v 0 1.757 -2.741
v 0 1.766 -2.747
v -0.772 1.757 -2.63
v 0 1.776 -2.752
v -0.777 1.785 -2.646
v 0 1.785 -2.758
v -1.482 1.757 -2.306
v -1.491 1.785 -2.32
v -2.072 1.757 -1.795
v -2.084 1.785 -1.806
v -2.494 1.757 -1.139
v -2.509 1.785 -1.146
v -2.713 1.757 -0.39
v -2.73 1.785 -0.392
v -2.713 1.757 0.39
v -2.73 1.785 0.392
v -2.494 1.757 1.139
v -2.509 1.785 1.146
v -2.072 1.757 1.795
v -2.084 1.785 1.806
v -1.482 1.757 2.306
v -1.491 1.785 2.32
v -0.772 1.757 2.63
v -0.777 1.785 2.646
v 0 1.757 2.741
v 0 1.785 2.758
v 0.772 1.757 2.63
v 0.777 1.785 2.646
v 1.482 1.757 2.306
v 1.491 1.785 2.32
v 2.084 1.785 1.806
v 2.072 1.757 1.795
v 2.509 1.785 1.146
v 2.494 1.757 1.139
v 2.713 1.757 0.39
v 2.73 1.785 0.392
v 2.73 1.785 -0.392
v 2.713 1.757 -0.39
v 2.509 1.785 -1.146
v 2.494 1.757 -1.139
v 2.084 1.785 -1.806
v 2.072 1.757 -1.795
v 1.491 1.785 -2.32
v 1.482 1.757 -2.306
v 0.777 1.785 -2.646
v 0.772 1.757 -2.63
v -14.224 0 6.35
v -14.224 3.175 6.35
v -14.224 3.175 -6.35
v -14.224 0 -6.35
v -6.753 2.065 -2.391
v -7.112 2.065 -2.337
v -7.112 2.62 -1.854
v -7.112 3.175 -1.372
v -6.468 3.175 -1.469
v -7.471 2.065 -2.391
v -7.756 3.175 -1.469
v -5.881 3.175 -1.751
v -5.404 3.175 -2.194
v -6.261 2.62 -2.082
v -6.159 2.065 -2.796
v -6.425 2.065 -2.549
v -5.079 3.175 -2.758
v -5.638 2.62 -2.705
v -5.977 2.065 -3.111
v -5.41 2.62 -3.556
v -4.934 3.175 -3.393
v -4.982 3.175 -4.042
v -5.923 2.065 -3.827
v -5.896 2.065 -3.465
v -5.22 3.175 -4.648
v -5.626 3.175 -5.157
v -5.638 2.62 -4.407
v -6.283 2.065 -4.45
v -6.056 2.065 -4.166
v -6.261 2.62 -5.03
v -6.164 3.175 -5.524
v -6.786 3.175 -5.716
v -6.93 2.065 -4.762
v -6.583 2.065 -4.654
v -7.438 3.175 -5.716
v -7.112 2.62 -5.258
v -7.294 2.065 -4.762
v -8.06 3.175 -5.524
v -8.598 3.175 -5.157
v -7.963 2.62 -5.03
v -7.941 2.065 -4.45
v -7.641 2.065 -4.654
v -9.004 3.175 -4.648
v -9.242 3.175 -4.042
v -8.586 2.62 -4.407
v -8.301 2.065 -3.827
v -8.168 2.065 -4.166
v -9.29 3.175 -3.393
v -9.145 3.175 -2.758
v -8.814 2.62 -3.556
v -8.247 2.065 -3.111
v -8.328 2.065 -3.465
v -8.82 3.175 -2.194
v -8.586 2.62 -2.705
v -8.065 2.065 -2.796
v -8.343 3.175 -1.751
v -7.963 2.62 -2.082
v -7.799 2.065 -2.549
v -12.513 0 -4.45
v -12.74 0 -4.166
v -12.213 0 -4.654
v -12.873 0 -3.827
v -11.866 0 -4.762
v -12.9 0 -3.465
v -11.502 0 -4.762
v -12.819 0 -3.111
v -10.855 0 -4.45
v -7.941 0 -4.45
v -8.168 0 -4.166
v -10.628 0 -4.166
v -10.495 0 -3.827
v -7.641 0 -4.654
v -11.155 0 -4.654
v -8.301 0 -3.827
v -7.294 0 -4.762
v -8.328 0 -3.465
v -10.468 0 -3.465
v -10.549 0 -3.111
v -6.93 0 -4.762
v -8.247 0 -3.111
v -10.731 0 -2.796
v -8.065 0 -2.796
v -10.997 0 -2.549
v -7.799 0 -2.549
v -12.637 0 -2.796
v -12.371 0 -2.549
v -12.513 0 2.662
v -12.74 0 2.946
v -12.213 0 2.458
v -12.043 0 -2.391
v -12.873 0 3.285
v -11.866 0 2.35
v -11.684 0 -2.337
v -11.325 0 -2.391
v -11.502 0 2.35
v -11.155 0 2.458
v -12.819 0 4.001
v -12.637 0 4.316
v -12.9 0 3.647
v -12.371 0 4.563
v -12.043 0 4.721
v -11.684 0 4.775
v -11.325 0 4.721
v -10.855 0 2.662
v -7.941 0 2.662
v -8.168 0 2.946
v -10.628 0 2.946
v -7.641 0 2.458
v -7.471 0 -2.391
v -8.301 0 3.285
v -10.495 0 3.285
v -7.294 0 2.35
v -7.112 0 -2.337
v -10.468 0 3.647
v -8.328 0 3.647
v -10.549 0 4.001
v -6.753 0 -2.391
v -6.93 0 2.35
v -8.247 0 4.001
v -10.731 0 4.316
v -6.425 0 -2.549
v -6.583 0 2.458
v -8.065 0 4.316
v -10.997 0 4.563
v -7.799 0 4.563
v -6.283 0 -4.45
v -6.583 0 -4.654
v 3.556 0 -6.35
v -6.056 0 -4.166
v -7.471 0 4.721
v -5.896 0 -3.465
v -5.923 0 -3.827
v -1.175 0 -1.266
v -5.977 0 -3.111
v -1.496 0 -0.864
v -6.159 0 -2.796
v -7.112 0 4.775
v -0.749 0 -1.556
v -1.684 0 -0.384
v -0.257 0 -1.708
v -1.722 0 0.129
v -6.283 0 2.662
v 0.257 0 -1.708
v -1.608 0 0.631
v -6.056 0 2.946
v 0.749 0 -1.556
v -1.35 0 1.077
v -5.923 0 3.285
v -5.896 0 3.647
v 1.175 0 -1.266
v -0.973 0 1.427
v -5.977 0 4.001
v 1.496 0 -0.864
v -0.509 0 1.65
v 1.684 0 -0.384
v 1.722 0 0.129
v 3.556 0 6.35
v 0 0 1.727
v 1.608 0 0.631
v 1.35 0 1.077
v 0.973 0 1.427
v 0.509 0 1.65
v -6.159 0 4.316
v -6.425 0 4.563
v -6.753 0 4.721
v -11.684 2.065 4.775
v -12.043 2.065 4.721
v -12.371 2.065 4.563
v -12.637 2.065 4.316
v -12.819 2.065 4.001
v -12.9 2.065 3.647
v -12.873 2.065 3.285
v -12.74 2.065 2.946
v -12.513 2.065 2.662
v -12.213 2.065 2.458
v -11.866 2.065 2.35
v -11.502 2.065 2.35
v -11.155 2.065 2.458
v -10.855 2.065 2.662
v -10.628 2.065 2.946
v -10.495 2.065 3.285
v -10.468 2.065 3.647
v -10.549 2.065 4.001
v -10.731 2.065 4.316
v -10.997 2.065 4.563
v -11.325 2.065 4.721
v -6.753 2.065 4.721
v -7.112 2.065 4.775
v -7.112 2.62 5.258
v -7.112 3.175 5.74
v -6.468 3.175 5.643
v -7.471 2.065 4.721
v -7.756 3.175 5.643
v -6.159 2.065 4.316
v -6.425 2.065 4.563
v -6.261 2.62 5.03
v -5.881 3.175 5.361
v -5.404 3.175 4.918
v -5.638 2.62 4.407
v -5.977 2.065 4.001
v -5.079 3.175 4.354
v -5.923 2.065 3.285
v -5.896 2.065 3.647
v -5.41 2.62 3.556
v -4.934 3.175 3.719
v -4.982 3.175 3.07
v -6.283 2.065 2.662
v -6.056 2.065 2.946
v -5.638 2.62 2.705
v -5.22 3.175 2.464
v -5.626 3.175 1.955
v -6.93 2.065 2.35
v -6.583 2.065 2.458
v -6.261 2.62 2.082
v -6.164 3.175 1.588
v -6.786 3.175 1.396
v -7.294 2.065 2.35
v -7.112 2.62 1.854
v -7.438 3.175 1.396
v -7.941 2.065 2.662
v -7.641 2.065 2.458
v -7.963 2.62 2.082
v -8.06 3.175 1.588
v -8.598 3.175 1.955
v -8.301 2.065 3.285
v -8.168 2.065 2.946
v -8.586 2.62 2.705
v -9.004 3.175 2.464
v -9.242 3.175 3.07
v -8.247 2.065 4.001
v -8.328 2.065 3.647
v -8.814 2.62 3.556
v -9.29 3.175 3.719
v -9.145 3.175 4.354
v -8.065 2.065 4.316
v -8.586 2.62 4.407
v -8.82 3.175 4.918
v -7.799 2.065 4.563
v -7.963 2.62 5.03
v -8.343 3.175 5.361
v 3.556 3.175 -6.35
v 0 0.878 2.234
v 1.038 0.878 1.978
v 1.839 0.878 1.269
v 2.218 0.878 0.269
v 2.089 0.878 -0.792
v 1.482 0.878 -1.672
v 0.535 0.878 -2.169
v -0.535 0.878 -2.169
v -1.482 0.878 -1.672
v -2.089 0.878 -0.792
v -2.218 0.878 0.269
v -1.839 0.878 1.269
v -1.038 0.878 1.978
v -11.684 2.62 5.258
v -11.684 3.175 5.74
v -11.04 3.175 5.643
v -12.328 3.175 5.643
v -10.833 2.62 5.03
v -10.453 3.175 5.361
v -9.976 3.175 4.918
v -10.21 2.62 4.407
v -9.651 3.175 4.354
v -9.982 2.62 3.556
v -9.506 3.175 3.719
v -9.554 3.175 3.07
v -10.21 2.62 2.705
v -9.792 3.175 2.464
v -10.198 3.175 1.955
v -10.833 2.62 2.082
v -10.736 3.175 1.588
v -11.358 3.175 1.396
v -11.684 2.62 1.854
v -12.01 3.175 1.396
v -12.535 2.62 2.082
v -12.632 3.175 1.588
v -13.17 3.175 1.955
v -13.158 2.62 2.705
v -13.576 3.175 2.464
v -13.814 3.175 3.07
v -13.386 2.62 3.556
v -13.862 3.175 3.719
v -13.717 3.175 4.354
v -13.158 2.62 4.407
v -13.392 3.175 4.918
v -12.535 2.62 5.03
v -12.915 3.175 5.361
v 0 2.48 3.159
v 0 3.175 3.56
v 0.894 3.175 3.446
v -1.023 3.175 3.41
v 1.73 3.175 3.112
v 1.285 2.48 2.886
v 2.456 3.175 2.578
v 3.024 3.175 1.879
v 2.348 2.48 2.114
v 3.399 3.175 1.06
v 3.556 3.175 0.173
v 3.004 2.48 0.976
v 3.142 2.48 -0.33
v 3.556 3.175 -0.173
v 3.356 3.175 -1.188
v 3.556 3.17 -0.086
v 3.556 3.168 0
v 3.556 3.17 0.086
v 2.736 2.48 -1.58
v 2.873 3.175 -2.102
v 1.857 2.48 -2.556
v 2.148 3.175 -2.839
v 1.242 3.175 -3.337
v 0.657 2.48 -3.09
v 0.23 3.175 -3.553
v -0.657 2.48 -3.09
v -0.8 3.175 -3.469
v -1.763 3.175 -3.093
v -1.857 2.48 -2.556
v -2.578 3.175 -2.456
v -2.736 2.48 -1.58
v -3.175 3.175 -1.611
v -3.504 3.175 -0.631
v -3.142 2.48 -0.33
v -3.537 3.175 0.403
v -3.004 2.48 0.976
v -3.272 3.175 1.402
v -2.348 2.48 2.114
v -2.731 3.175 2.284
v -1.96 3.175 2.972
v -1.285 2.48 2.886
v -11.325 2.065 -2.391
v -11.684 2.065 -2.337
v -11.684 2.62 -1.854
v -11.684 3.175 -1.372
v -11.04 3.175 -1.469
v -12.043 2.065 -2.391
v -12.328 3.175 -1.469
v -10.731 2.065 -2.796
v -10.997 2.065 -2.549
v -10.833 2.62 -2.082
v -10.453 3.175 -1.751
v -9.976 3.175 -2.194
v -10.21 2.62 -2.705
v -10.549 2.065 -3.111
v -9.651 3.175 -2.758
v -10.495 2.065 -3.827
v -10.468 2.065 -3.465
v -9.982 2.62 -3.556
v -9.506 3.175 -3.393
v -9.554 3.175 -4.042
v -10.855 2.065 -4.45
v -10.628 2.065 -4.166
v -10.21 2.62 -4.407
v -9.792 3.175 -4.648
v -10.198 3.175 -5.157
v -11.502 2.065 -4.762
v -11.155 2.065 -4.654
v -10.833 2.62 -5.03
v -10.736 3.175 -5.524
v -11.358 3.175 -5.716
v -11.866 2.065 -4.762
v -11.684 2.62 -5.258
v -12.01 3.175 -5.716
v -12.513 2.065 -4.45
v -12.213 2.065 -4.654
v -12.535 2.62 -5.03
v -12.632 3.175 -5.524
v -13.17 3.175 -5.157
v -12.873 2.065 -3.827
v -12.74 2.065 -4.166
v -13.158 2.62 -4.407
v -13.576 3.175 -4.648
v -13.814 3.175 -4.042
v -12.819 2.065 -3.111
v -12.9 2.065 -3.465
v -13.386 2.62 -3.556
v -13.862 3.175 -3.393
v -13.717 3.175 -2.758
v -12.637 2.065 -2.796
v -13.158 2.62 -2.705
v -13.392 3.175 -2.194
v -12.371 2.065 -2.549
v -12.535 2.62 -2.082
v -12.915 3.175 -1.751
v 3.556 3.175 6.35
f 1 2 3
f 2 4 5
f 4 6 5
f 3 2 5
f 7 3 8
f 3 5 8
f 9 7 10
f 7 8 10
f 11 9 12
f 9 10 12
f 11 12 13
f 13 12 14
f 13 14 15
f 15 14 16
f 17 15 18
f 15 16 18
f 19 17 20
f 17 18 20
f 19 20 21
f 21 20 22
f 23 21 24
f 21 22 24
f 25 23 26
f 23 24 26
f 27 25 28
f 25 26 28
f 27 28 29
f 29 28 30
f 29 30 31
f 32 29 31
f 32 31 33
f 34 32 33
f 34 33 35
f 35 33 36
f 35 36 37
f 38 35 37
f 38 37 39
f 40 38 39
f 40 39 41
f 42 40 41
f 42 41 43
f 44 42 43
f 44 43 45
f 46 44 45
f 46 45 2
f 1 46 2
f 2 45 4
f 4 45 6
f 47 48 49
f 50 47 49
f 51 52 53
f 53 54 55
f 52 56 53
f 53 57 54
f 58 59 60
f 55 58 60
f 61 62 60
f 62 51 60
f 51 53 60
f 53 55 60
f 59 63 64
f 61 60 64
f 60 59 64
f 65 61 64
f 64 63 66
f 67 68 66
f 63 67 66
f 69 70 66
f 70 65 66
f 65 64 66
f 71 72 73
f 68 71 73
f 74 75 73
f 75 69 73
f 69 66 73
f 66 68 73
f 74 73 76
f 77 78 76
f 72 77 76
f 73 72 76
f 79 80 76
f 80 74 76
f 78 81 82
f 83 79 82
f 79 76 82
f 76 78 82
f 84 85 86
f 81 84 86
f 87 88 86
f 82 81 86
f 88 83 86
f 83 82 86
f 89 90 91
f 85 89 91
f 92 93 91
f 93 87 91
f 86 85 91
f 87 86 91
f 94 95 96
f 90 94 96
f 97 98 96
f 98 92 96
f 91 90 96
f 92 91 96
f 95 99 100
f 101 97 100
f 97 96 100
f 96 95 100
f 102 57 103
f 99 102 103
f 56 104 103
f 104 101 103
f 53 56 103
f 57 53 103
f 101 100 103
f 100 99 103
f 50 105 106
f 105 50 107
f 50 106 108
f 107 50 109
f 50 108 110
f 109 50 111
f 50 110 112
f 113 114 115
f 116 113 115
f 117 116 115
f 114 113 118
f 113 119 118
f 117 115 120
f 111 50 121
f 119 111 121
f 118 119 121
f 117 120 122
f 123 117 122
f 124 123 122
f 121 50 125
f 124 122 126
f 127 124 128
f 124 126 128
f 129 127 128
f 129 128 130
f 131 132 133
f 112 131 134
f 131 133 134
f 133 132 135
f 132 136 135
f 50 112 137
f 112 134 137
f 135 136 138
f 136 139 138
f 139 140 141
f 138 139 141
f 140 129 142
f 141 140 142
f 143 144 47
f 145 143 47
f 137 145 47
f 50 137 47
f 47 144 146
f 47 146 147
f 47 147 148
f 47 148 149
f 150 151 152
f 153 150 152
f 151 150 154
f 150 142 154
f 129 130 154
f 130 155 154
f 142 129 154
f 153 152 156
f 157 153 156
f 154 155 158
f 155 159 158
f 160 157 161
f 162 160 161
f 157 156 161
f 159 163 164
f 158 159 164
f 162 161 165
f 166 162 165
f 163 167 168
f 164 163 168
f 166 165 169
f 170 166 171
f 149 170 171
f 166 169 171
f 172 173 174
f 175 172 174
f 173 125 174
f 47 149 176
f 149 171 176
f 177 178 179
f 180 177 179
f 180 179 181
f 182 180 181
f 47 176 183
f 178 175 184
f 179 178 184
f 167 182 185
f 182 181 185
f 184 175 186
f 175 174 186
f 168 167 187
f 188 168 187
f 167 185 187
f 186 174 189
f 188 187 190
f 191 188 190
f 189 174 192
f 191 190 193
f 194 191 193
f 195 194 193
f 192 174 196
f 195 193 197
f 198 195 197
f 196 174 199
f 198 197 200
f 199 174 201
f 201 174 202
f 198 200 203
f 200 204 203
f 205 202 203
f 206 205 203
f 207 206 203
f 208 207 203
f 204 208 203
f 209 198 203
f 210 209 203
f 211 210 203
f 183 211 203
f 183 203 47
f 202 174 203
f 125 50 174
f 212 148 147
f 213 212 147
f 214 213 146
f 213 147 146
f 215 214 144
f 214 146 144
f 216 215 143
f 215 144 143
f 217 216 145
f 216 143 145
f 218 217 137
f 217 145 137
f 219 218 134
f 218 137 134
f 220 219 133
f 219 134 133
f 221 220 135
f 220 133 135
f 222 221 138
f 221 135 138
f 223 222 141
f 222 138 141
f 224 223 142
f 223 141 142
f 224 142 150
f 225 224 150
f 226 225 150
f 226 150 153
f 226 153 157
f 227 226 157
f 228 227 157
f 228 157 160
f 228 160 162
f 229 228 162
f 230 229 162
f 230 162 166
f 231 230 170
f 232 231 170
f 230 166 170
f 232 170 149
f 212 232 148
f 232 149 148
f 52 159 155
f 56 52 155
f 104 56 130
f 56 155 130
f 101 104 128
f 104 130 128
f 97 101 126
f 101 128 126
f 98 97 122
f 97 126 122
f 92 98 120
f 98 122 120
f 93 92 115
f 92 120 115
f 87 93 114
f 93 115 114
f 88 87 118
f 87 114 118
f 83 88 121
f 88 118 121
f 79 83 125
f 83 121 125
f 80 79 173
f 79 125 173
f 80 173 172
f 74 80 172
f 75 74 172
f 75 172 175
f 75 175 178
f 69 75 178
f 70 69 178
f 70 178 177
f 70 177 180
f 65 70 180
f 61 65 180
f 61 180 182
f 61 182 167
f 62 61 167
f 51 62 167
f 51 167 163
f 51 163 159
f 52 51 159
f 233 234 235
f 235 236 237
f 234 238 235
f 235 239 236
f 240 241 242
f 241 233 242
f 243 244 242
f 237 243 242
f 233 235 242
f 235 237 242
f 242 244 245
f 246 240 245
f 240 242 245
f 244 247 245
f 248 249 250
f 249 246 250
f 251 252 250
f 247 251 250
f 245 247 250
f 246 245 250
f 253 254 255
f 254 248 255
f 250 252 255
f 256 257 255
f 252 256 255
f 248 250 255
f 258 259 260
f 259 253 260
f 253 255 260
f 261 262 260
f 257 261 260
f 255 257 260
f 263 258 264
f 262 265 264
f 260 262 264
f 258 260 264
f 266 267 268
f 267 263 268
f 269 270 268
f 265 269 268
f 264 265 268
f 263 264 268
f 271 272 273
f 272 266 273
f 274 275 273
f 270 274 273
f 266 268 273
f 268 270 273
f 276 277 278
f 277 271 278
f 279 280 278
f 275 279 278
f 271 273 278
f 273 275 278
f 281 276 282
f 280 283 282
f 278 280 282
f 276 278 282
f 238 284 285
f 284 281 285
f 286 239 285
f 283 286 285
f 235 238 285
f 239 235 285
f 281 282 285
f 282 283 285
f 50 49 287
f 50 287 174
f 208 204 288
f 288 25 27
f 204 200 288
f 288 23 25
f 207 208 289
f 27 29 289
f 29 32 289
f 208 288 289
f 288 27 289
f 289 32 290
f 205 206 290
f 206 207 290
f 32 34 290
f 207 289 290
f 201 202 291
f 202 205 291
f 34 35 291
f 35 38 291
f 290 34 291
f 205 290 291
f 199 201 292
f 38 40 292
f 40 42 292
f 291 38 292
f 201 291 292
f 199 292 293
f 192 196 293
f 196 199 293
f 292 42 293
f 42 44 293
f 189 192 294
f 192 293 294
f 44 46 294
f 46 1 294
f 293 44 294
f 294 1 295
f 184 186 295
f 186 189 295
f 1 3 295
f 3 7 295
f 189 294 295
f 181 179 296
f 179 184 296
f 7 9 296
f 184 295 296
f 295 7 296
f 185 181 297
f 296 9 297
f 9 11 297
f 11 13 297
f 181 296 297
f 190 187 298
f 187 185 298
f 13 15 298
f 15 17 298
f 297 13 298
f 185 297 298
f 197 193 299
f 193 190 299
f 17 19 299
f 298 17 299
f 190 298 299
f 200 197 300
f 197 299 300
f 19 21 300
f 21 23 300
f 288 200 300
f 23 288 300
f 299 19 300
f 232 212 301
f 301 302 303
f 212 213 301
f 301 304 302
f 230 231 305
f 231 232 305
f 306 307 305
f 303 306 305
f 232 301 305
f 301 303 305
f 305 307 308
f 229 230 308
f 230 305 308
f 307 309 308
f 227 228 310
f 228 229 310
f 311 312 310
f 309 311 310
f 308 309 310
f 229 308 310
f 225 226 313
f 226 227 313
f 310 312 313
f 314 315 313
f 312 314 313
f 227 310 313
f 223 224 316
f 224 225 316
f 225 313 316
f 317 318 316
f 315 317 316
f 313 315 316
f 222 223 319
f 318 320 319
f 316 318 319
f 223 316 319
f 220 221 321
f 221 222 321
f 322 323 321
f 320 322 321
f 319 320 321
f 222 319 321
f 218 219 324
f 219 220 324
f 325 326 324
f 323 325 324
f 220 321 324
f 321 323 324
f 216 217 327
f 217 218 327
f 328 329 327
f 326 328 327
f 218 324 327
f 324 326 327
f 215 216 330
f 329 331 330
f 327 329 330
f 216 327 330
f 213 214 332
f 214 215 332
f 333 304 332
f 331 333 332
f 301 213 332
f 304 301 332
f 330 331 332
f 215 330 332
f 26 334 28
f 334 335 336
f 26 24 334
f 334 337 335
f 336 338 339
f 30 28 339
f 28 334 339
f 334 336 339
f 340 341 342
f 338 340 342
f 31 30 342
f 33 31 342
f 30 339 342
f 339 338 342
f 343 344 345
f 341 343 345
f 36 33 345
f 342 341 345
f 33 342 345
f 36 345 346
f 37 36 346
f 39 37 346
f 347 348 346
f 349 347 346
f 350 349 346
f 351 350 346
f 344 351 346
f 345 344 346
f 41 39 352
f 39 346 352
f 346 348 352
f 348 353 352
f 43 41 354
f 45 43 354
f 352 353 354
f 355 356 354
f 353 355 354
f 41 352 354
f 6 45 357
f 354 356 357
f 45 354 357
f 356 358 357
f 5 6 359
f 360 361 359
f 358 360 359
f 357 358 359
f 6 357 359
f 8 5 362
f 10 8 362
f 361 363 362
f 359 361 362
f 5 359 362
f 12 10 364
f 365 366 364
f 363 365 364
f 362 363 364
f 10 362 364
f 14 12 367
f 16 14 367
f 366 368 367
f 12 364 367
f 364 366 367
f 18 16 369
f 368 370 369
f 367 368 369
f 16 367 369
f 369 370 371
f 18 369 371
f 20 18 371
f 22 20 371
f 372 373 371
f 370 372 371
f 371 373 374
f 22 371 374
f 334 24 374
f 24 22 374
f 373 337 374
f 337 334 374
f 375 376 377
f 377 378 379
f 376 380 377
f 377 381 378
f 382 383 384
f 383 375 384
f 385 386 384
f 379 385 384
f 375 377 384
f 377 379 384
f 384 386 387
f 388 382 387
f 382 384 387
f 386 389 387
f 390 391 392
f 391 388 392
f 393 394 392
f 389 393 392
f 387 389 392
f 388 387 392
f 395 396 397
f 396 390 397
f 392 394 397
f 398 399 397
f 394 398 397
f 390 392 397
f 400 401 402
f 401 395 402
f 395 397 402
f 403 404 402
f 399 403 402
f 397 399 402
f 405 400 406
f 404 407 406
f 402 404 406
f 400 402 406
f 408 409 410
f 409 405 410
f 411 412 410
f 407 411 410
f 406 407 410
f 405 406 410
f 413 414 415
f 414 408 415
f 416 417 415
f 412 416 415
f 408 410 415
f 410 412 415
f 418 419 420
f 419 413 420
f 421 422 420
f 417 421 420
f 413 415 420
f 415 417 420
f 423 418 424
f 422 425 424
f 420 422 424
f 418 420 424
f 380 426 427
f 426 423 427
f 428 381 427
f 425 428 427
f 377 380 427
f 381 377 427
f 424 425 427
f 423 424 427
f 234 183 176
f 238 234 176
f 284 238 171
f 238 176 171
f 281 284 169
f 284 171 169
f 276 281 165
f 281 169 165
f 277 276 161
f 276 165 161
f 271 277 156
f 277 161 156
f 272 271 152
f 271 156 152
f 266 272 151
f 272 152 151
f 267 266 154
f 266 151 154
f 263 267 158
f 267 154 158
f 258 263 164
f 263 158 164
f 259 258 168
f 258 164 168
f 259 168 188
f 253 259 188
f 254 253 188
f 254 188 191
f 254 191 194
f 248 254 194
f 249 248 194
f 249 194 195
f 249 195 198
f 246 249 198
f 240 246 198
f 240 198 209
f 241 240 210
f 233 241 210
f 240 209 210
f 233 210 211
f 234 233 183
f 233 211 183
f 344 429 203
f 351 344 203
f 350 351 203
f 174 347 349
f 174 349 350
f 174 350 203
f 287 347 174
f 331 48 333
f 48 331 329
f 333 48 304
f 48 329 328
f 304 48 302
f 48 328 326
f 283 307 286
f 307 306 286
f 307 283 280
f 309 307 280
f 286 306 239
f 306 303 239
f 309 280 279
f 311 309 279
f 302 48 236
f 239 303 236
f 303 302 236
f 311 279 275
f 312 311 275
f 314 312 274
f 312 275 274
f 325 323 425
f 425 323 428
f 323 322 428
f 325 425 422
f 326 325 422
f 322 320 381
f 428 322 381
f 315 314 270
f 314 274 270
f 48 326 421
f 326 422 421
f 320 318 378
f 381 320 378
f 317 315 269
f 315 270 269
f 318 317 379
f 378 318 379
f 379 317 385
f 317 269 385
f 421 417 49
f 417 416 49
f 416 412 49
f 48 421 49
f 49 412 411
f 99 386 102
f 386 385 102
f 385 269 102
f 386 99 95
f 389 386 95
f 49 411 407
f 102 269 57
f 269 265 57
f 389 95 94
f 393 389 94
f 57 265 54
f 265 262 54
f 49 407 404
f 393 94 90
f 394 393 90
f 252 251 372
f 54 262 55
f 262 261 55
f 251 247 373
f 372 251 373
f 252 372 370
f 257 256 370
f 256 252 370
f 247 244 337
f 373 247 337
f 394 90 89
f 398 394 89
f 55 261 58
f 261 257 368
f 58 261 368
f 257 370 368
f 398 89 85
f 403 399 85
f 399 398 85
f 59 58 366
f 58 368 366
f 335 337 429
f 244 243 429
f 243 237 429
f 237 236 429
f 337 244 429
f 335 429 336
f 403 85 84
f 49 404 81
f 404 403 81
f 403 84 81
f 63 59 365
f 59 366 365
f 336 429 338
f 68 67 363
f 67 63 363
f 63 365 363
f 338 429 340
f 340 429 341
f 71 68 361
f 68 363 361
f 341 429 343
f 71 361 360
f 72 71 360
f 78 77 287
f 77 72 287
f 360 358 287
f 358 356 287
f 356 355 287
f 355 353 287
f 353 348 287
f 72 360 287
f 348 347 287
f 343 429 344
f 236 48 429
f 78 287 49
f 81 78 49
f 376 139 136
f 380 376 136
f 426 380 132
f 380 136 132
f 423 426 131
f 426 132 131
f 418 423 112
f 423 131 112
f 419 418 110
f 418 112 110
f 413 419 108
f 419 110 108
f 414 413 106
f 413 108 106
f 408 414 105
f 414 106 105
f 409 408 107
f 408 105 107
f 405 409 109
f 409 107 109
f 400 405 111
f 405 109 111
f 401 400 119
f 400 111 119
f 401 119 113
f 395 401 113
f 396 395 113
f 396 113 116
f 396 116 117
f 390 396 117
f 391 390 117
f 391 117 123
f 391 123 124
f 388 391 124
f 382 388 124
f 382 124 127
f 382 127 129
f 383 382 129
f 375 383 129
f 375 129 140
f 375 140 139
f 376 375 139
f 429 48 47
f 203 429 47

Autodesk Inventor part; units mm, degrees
ref_plane "YZ Plane" through (0, 0, 0) normal (1, 0, 0) x (0, 1, 0)
sketch "Sketch1" plane through (0, 0, 0) normal (1, 0, 0) x (0, 1, 0)
  line L0 (-1.3067, 0) -> (7.8401, 0) construction
  line L1 (0, -10.9768) -> (0, 10.9768) construction
  line L2 (0, -1.7272) -> (0, -6.35)
  line L3 (0, -1.7272) -> (0, -1.7272)
  line L4 (0, -1.7272) -> (3.175, -3.5603)
  line L5 (3.175, -3.5603) -> (3.175, -6.35)
  line L6 (3.175, -6.35) -> (0, -6.35)
  circle A0 centre (3.3584, 0) radius 3.175 construction
  line L7 (2.5647, 7.8406) -> (4.1522, 7.8406) construction
  line L8 (4.1522, 7.8406) -> (4.1522, -7.8406) construction
  line L9 (4.1522, -7.8406) -> (2.5647, -7.8406) construction
  line L10 (2.5647, -7.8406) -> (2.5647, 7.8406) construction
  line L11 (2.5647, 7.8406) -> (4.1522, -7.8406) construction
  line L12 (4.1522, 7.8406) -> (2.5647, -7.8406) construction
  line L13 (0, 1.7272) -> (0, 6.35)
  line L14 (0, 1.7272) -> (0, 1.7272)
  line L15 (0, 1.7272) -> (3.175, 3.5603)
  line L16 (3.175, 3.5603) -> (3.175, 6.35)
  line L17 (3.175, 6.35) -> (0, 6.35)
  point P0 (0, 0)
  point P1 (2.3851, -3.0222)
  point P2 (2.3851, 3.0222)
  dimension "d12" = 60
  dimension "d13" = 0
  dimension "bearing_thickness" = 3.175
  dimension "d15" = 1.7272
  dimension "d17" = 6.35
  dimension "d18" = 1.5875
  dimension "d23" = 12.7
  dimension "d52" = 3.3584
sketch "Sketch11" plane through (0, 0, 0) normal (1, 0, 0) x (0, 1, 0)
  line L0 (3.175, 6.35) -> (0, 6.35) projected
  line L1 (3.175, -6.35) -> (0, -6.35) projected
  line L2 (-1.3067, 0) -> (7.8401, 0) construction
  line L3 (0, -10.9768) -> (0, 10.9768) construction
  line L4 (3.175, 6.35) -> (3.175, 0.762)
  line L5 (3.175, 0.762) -> (0, 0.762)
  line L6 (0, 6.35) -> (0, 0.762)
  line L7 (3.175, -6.35) -> (0, -6.35)
  line L8 (0, 10.9768) -> (0, -10.9768) construction
  line L9 (3.175, -6.35) -> (3.175, -0.762)
  line L10 (3.175, -0.762) -> (0, -0.762)
  line L11 (0, -6.35) -> (0, -0.762)
  point P0 (0, 0)
  dimension "d54" = 5.588
extrude "Extrusion4" add sketch "Sketch11" along normal blind 3.556 and the other way blind 14.224
sketch "Sketch17" plane through (3.556, 0, 0) normal (1, 0, 0) x (0, 0, -1)
  line L0 (-6.35, 3.175) -> (-0.762, 3.175) projected
  line L1 (-0.762, 3.175) -> (0.762, 3.175)
  line L2 (0.762, 3.175) -> (0.762, 0)
  line L3 (0.762, 0) -> (-0.762, 0)
  line L4 (-0.762, 0) -> (-0.762, 3.175)
  point P0 (0, 0)
ref_plane "Work Plane3" through (0, 3.175, 6.35) normal (1, 0, 0) x (0, -1, 0)
extrude "Extrusion6" add sketch "Sketch17" against normal blind 17.78
sketch "Sketch14" plane through (-14.224, 3.175, -6.35) normal (0, 1, 0) x (1, 0, 0)
  line L0 (-3.556, -6.35) -> (21.336, -6.35) projected
  line L1 (0, -5.588) -> (0, 0) projected
  point P0 (14.224, -6.35)
  point P1 (2.54, -2.794)
  point P2 (7.112, -2.794)
  point P3 (2.54, -9.906)
  point P4 (7.112, -9.906)
  dimension "d65" = 7.112
  dimension "d66" = 11.684
  dimension "d67" = 3.556
hole "Hole2" at (-11.684, 3.175, -3.556) at (-7.112, 3.175, -3.556) at (-11.684, 3.175, 3.556) at (-7.112, 3.175, 3.556) direction (0, -1, 0) diameter 2.4384 depth 6.6294 tip angle 118 countersink diameter 4.3688 countersink angle 82 clearance for "Flat Head Machine Screw (82)" size "#2" standard "Ansi Unified Screw Threads"
sketch "Sketch12" plane through (0, 3.175, 6.35) normal (1, 0, 0) x (0, -1, 0)
  line L0 (3.175, 4.6228) -> (0, 2.7897) projected
  line L1 (3.175, 8.0772) -> (0, 9.9103) projected
  line L2 (4.4817, 6.35) -> (-4.6651, 6.35) construction
  line L3 (3.175, 17.3268) -> (3.175, -4.6268) construction
  line L4 (3.175, 4.6228) -> (3.175, 7.0113)
  line L5 (3.175, 4.6228) -> (3.175, 4.6228)
  line L6 (3.175, 8.0772) -> (3.175, 8.0772)
  line L7 (3.175, 7.0113) -> (3.175, 8.0772)
  line L8 (0, 2.7897) -> (0, 9.9103)
  line L9 (0, 0) -> (0, 5.588) projected
  point P0 (3.175, 6.35)
extrude "Extrusion5" [suppressed]
ref_plane "Work Plane4" through (0, 2.5647, -7.8406) normal (-1, 0, 0) x (0, 0, 1)
sketch "Sketch16" plane through (0, 2.5647, -7.8406) normal (-1, 0, 0) x (0, 0, 1)
  line L0 (6.1134, -2.5647) -> (4.2803, 0.6103) projected
  line L1 (9.5678, -2.5647) -> (11.4008, 0.6103) projected
  line L2 (11.4008, 0.6103) -> (4.2803, 0.6103) projected
  line L3 (7.1793, -2.5647) -> (6.1134, -2.5647) projected
  line L4 (9.5678, -2.5647) -> (7.1793, -2.5647) projected
  line L5 (9.5678, -2.5647) -> (9.5678, -2.5647)
  line L6 (6.1134, -2.5647) -> (6.1134, -2.5647)
  line L7 (7.8406, -3.8713) -> (7.8406, 5.2754) projected
  line L8 (7.8406, 0.6103) -> (7.8406, -2.5647)
revolve "Revolution7" cut sketch "Sketch16" angle 360 about axis through (0, 3.175, 0) along (0, -1, 0) contours L2 L1 L4 L7
sketch "Sketch13" plane through (0, 3.175, 6.35) normal (1, 0, 0) x (0, -1, 0)
  circle A0 centre (-0.1834, 6.35) radius 3.175 projected
  line L0 (4.4817, 6.35) -> (-4.6651, 6.35) construction
  line L1 (-3.3584, 6.35) -> (2.9916, 6.35)
  point P0 (3.175, 6.35)
revolve "Revolution6" cut sketch "Sketch13" angle 360 about axis through (0, 6.5334, 0) along (0, -1, 0)
equation "\"d12\" = bearing_angle"
equation "\"d15\" = bearing_spacing"
equation "\"d65\" = hole1_setback"
equation "\"d66\" = hole2_setback"
equation "\"d67\" = hole_lateral"
equation "\"hole1_setback_qq\" = 7.112"
equation "\"hole_lateral_qq\" = 3.556"
equation "\"hole2_setback_qq\" = 11.684"
equation "\"bearing_angle_qq\" = 60deg"
equation "\"bearing_spacing_qq\" = 1.7272"
equation "\"bearing_angle\" = 60deg"
equation "\"bearing_spacing\" = 1.7272"
equation "\"hole1_setback\" = 7.112"
equation "\"hole2_setback\" = 11.684"
equation "\"hole_lateral\" = 3.556"
properties part number "v2_bearing_insert_thick_round" material "Stainless Steel, 440C"
